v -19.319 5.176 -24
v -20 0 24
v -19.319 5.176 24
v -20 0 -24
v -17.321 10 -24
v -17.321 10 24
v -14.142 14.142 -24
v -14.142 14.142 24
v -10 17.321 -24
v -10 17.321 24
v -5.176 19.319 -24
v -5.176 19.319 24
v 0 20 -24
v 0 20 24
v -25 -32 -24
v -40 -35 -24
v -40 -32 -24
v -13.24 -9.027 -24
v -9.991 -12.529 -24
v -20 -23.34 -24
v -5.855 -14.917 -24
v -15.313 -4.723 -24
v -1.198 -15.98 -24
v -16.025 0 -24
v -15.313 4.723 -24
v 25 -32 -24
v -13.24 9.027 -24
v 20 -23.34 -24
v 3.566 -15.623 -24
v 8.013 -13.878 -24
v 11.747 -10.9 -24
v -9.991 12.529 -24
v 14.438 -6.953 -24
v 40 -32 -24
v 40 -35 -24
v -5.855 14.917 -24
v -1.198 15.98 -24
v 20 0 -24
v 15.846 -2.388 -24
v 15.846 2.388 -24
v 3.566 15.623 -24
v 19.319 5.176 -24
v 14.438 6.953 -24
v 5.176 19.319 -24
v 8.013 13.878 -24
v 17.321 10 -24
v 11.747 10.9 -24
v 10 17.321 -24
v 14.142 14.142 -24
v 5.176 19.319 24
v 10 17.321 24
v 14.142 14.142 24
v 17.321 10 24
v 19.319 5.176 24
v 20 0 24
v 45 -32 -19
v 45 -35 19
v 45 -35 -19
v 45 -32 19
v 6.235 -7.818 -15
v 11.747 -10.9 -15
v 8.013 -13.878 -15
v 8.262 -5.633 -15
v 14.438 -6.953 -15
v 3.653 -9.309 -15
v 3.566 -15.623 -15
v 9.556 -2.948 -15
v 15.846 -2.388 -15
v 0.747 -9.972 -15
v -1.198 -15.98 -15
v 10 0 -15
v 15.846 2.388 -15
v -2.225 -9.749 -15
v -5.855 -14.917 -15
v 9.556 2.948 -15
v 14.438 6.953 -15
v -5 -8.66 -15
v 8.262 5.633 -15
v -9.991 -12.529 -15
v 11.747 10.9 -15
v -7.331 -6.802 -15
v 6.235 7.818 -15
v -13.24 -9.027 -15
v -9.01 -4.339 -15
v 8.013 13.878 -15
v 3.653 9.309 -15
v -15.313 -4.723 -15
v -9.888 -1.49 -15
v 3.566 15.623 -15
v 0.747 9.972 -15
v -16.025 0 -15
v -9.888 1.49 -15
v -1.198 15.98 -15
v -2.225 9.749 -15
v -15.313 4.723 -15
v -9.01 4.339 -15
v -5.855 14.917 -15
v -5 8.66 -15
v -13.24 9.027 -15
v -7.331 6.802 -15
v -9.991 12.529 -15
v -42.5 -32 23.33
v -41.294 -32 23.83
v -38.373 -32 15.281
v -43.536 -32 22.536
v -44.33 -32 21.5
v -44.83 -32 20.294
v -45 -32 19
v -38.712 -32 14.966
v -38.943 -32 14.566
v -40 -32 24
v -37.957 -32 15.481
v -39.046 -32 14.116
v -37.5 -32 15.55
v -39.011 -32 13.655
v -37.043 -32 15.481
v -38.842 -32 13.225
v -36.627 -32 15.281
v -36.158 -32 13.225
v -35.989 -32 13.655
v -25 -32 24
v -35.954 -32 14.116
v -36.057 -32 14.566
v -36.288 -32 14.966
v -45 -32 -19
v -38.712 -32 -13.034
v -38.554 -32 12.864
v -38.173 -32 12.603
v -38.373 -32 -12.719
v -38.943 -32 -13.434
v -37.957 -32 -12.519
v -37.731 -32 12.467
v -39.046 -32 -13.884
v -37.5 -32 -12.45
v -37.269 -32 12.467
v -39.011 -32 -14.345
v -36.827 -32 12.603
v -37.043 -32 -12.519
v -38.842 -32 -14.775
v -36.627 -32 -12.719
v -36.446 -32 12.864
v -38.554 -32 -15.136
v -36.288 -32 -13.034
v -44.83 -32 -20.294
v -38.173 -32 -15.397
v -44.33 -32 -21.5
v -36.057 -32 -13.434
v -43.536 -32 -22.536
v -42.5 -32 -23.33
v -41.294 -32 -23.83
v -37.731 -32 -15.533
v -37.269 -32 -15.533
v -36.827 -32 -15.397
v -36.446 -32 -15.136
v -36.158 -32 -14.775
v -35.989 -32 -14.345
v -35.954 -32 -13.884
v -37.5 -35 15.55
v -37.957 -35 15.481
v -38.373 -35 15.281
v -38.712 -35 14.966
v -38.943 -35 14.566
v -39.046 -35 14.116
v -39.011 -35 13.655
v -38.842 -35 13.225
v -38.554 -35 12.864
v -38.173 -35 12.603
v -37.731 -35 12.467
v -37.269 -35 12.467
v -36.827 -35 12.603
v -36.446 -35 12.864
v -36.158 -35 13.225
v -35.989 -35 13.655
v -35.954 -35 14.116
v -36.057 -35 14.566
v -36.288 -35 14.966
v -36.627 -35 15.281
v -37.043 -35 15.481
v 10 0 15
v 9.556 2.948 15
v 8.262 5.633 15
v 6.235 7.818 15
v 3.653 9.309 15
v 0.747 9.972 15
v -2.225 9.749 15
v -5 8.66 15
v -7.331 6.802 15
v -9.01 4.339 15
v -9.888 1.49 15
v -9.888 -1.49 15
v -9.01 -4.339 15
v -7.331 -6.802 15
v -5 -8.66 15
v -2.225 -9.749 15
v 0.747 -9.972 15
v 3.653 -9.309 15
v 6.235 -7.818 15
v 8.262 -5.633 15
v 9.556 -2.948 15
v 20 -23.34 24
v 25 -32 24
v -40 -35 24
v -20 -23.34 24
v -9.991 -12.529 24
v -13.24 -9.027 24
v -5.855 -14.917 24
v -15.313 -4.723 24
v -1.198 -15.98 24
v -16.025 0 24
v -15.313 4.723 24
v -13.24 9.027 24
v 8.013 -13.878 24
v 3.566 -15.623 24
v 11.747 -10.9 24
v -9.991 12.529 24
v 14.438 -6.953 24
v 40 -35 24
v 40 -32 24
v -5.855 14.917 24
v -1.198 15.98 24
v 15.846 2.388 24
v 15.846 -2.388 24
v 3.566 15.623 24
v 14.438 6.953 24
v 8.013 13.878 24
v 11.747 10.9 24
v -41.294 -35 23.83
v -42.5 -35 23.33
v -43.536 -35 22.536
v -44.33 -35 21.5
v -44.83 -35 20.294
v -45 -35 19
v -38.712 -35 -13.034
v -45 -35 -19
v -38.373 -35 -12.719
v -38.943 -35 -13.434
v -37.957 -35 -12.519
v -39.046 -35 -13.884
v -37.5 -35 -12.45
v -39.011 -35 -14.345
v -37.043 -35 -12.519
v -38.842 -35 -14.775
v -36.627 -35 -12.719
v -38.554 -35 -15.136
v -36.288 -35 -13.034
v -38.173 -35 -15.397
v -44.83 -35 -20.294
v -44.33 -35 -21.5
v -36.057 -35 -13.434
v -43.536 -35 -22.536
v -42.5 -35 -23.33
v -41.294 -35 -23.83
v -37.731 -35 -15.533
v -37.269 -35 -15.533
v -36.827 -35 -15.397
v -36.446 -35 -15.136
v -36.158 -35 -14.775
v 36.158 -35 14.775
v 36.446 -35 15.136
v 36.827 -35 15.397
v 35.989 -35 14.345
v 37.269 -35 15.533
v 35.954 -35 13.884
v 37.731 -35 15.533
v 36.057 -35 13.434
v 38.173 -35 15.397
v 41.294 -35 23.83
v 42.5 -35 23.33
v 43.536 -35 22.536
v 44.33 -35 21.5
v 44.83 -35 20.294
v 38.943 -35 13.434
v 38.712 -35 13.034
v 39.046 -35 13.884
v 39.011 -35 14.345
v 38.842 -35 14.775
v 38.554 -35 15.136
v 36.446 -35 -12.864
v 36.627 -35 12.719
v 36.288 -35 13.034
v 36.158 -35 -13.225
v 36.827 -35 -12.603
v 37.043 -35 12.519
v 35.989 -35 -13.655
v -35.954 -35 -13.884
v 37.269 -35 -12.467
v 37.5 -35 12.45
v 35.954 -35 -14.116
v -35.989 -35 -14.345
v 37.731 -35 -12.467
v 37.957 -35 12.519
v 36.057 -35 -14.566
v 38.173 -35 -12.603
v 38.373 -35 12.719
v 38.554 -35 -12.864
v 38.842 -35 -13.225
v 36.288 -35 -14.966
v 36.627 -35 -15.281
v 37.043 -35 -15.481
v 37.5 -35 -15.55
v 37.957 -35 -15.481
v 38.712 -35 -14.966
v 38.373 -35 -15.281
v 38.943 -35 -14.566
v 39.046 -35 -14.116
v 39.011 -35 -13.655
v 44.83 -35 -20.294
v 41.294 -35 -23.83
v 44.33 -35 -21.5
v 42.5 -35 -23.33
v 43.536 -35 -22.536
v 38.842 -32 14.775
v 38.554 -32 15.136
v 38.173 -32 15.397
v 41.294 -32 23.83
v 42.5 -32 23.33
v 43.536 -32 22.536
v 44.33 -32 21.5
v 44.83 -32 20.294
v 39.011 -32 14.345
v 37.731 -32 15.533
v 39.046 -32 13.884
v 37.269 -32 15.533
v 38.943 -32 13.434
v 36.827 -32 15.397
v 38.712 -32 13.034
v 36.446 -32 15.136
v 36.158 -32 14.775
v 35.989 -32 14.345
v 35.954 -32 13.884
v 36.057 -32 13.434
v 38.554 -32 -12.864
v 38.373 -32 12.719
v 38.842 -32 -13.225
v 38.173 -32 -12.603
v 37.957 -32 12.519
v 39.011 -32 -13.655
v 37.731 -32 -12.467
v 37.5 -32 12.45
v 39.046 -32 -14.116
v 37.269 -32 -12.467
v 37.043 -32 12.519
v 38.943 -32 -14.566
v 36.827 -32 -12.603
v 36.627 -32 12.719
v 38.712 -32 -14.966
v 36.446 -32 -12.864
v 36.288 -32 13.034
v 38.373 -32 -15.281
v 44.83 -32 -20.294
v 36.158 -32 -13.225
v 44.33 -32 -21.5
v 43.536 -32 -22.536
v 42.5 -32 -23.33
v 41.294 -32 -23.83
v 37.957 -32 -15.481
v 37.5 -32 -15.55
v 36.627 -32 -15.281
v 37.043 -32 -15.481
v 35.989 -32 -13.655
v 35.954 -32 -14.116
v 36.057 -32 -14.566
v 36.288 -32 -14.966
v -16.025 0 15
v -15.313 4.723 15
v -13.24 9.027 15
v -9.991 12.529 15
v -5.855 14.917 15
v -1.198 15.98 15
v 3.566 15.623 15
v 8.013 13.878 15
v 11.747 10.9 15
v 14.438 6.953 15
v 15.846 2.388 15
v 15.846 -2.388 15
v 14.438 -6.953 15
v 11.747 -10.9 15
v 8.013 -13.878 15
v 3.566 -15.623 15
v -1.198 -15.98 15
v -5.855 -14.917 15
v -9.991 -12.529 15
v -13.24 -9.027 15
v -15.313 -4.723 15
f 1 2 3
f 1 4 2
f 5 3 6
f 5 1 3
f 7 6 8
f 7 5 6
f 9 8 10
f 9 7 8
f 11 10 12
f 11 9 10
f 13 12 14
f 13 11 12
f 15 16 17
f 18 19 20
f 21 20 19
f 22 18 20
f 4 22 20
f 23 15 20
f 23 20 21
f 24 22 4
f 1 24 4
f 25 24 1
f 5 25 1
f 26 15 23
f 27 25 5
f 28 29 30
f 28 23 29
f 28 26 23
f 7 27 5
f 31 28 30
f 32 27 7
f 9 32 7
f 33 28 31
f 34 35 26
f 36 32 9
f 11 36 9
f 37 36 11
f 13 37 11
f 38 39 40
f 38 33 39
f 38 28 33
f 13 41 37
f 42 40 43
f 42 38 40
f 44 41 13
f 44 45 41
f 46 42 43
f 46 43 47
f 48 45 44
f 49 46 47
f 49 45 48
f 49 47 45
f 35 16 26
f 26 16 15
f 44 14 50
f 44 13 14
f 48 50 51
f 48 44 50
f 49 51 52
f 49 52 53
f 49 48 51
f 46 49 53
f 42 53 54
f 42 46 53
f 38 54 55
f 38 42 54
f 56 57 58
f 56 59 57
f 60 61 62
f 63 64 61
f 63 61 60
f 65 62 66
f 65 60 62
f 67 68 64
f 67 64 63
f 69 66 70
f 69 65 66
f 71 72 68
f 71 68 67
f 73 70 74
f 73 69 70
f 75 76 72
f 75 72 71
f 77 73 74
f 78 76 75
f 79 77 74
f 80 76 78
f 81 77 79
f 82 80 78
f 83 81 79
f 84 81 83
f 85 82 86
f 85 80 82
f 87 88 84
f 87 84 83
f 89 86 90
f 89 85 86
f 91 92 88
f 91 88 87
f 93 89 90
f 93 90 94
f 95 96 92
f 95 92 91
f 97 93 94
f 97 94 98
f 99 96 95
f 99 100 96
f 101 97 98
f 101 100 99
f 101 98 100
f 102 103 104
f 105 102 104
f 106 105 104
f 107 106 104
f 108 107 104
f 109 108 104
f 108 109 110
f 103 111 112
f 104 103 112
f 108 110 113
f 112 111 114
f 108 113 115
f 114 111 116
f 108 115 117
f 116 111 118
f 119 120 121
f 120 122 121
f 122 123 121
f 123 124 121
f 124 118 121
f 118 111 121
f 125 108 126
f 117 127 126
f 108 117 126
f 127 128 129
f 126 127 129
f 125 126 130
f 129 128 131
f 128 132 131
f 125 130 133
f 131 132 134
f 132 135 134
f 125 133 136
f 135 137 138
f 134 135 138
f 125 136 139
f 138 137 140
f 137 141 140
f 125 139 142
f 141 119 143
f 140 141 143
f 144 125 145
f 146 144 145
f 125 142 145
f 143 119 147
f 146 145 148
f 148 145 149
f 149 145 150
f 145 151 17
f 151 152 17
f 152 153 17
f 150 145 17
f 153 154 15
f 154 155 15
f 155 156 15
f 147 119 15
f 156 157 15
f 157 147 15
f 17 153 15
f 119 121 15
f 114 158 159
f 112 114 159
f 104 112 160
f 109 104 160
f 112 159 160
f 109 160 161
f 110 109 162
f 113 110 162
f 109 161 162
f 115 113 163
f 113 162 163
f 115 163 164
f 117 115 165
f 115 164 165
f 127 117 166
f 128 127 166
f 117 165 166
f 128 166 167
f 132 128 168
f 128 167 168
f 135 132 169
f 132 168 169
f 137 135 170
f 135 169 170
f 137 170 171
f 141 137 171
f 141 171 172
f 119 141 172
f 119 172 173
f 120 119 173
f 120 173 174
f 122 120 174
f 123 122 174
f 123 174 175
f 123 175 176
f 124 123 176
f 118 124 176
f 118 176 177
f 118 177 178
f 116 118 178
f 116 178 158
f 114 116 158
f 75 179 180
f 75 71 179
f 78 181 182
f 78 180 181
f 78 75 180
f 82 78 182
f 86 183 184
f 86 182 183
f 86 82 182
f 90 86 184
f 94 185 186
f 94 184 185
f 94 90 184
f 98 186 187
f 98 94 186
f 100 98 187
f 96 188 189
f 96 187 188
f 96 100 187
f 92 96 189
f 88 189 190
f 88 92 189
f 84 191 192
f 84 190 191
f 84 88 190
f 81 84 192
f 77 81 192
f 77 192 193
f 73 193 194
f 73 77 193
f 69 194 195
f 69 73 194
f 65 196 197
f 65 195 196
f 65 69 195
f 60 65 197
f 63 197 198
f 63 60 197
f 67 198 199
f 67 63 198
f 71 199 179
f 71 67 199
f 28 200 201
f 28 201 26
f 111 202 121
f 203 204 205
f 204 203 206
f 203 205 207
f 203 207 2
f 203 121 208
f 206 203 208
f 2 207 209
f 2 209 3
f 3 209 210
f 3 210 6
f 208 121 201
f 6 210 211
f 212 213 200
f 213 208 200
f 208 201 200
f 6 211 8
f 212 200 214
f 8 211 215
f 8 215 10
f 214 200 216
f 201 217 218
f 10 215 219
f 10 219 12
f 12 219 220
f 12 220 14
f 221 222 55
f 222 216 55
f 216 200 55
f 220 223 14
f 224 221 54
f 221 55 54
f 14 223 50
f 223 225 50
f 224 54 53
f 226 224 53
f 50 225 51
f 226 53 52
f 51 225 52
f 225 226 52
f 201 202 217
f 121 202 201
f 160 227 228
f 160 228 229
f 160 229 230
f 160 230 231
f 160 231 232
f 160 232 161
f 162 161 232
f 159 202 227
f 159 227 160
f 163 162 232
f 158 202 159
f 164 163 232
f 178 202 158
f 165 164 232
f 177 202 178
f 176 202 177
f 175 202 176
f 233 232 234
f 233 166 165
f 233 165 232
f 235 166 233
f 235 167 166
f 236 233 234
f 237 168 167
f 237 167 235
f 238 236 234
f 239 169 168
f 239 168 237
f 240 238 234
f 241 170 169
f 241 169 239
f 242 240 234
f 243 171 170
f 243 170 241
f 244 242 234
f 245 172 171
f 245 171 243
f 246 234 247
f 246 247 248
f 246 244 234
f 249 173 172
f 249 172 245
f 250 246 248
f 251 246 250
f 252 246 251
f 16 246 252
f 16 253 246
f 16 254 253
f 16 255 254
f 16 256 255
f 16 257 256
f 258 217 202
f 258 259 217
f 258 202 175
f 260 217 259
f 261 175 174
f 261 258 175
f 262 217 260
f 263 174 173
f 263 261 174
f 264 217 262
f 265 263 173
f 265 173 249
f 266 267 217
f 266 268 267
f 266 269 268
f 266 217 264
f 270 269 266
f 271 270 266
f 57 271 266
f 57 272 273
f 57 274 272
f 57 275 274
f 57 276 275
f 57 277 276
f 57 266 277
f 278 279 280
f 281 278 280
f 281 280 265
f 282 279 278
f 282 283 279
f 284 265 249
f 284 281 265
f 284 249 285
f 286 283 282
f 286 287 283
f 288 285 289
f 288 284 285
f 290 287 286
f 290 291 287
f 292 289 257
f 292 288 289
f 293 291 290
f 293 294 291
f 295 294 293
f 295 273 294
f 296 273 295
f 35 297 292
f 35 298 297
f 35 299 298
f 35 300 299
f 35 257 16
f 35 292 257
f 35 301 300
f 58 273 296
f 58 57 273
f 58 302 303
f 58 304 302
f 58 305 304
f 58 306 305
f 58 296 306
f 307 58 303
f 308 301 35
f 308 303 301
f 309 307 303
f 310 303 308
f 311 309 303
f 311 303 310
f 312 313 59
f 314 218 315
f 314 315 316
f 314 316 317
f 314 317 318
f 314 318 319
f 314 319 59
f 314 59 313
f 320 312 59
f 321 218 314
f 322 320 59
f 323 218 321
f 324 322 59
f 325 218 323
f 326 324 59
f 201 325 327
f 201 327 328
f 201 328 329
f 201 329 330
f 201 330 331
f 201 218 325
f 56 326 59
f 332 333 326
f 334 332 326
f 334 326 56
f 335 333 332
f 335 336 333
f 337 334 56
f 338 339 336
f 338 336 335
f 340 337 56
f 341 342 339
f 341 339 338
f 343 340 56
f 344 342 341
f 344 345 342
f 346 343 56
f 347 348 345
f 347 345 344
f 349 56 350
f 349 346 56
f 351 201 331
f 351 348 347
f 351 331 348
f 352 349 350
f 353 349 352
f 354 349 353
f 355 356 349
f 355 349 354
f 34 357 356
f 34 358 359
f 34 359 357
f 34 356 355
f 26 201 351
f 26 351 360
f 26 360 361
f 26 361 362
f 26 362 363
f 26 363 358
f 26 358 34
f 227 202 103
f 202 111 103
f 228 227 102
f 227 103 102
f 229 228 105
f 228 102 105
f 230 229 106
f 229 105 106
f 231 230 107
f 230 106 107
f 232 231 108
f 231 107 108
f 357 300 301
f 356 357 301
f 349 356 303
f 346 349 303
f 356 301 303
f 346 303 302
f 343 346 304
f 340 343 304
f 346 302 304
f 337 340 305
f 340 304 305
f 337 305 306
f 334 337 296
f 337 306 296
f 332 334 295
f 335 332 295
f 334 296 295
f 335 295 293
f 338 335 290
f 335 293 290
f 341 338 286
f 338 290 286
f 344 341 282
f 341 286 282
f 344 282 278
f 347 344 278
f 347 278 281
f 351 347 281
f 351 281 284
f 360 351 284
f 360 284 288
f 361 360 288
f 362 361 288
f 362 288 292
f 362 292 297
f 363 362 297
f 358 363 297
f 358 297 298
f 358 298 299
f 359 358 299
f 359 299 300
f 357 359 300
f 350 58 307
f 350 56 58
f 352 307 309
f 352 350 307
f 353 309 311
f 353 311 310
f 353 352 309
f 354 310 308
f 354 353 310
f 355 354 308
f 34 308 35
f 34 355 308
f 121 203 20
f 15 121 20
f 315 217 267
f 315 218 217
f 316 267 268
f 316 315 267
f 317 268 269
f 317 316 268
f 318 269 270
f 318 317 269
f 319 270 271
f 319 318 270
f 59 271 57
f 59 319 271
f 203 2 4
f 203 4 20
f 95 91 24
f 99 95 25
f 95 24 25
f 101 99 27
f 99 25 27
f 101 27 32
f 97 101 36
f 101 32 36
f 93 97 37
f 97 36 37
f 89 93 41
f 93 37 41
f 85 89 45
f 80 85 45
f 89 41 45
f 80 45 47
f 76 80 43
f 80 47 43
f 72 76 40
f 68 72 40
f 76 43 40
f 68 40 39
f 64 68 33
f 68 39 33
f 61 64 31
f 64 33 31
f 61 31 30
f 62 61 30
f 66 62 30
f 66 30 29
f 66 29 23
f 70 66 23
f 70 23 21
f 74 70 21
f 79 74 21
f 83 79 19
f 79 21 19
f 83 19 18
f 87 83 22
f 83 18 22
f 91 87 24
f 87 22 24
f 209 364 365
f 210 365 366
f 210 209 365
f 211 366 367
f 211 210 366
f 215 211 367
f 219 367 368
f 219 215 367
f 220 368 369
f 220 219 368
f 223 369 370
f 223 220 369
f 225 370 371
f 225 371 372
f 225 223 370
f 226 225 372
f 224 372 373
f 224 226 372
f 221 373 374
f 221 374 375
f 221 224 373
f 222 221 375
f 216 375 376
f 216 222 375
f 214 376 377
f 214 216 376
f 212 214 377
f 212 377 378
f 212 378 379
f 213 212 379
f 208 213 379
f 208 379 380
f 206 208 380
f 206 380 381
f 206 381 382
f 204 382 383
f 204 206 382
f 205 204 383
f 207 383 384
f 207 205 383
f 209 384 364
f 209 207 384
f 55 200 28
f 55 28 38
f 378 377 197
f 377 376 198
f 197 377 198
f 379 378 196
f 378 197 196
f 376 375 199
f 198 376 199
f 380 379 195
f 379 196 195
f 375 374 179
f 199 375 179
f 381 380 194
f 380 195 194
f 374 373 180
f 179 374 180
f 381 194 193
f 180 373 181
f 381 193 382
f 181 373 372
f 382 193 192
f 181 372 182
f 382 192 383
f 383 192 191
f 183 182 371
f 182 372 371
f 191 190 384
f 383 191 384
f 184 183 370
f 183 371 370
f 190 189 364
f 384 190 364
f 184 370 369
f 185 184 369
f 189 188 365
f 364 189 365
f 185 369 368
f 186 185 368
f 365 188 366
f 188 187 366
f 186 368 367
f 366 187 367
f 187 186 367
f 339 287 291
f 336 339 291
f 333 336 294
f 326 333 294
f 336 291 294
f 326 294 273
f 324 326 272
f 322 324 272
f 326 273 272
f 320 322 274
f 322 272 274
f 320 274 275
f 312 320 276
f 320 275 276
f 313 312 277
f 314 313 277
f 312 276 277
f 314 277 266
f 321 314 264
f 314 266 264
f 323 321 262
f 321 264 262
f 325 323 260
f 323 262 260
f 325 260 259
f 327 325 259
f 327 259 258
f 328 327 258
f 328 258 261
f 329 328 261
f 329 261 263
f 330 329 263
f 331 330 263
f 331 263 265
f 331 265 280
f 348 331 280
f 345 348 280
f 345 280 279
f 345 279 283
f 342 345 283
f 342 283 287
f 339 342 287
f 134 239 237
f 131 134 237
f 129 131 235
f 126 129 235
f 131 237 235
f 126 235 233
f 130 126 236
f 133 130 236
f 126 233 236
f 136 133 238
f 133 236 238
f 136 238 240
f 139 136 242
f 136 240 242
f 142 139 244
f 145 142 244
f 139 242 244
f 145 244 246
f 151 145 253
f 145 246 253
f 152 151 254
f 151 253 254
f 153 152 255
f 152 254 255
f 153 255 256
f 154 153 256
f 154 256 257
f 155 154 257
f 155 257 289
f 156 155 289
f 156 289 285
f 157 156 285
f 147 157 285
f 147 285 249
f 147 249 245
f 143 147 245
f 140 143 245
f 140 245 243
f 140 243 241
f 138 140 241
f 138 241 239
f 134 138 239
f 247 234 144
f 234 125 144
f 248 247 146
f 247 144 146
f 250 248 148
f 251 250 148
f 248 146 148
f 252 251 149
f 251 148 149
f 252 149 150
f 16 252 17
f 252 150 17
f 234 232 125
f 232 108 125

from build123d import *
from OCP.BRepFilletAPI import BRepFilletAPI_MakeChamfer

# Parameters (mm, degrees)
SKETCH_1_R          = 10
EXTRUDE_1_DEPTH     = 24
SKETCH_4_R          = 16.025
CUT_EXTRUDE_3_DEPTH = 9
SKETCH_5_W          = 48
SKETCH_5_H          = 3
EXTRUDE_2_DEPTH     = 25
CHAMFER_1_SIZE      = 5
CHAMFER_1_SIZE2     = 8.660254038
SKETCH_7_R          = 1.55
CUT_EXTRUDE_4_DEPTH = 76.00666637
FILLET_1_R          = 20
FILLET_2_R          = 5


with BuildPart() as part:
    # 草图1 → 凸台-拉伸1 (new, symmetric)
    with BuildSketch(Plane.XY):
        Polygon((-20, -35), (-20, 0), (-20, 20), (20, 20), (20, 0), (20, -35), align=None)
        Circle(SKETCH_1_R, mode=Mode.SUBTRACT)
    extrude(amount=EXTRUDE_1_DEPTH, both=True)

    # 草图4 → 切除-拉伸3 (cut)
    with BuildSketch(Plane(origin=(0, 0, -24), x_dir=(-1, 0, 0), z_dir=(0, 0, -1))):
        Circle(SKETCH_4_R)
    cut_extrude_3 = extrude(amount=-CUT_EXTRUDE_3_DEPTH, mode=Mode.SUBTRACT)

    # 镜向1: 切除-拉伸3 across plane
    add(cut_extrude_3.mirror(Plane.XY), mode=Mode.SUBTRACT)

    # 草图5 → 凸台-拉伸2 (add)
    with BuildSketch(Plane(origin=(20, 0, 0), x_dir=(0, 0, -1), z_dir=(1, 0, 0))):
        with Locations((0, -33.5)):
            Rectangle(SKETCH_5_W, SKETCH_5_H)
    extrude_2 = extrude(amount=EXTRUDE_2_DEPTH)

    # 镜向2: 凸台-拉伸2 across plane
    add(extrude_2.mirror(Plane.ZY))

    # 倒角1: one chamfer whose edges measure the first distance from different faces: ONE call of the kernel's chamfer builder (chamfer() names one face for all edges)
    chamfer_1_edges_1 = [part.edges().sort_by_distance(p)[0] for p in [
        (20, -32, 0),
    ]]
    chamfer_1_side_1 = [part.faces().sort_by_distance(p)[0] for p in [
        (32.5, -32, 0),
    ]]
    chamfer_1_edges_2 = [part.edges().sort_by_distance(p)[0] for p in [
        (-20, -32, 0),
    ]]
    chamfer_1_side_2 = [part.faces().sort_by_distance(p)[0] for p in [
        (-32.5, -32, 0),
    ]]
    chamfer_1 = BRepFilletAPI_MakeChamfer(part.part.solid().wrapped)
    for e in chamfer_1_edges_1:
        chamfer_1.Add(CHAMFER_1_SIZE, CHAMFER_1_SIZE2, e.wrapped, chamfer_1_side_1[0].wrapped)  # the first distance lies on this face
    for e in chamfer_1_edges_2:
        chamfer_1.Add(CHAMFER_1_SIZE, CHAMFER_1_SIZE2, e.wrapped, chamfer_1_side_2[0].wrapped)  # the first distance lies on this face
    add(Compound.cast(chamfer_1.Shape()), mode=Mode.REPLACE)

    # 草图7 → 切除-拉伸4 (cut, through all)
    with BuildSketch(Plane.XZ.offset(35)):
        with Locations(Location((37.5, 14, 0), (0, 0, 270))):
            Circle(SKETCH_7_R)
        with Locations(Location((37.5, -14, 0), (0, 0, 270))):
            Circle(SKETCH_7_R)
        with Locations(Location((-37.5, 14, 0), (0, 0, 90))):
            Circle(SKETCH_7_R)
        with Locations(Location((-37.5, -14, 0), (0, 0, 90))):
            Circle(SKETCH_7_R)
    extrude(amount=-CUT_EXTRUDE_4_DEPTH, mode=Mode.SUBTRACT)

    # 圆角1
    fillet_1_edges = [part.edges().sort_by_distance(p)[0] for p in [
        (20, 20, 0),
        (-20, 20, 0),
    ]]
    fillet(fillet_1_edges, radius=FILLET_1_R - 0.0001)  # a hair under: the kernel refuses the full size

    # 圆角2
    fillet_2_edges = [part.edges().sort_by_distance(p)[0] for p in [
        (45, -33.5, 24),
        (45, -33.5, -24),
        (-45, -33.5, 24),
        (-45, -33.5, -24),
    ]]
    fillet(fillet_2_edges, radius=FILLET_2_R)


solid = part.part
